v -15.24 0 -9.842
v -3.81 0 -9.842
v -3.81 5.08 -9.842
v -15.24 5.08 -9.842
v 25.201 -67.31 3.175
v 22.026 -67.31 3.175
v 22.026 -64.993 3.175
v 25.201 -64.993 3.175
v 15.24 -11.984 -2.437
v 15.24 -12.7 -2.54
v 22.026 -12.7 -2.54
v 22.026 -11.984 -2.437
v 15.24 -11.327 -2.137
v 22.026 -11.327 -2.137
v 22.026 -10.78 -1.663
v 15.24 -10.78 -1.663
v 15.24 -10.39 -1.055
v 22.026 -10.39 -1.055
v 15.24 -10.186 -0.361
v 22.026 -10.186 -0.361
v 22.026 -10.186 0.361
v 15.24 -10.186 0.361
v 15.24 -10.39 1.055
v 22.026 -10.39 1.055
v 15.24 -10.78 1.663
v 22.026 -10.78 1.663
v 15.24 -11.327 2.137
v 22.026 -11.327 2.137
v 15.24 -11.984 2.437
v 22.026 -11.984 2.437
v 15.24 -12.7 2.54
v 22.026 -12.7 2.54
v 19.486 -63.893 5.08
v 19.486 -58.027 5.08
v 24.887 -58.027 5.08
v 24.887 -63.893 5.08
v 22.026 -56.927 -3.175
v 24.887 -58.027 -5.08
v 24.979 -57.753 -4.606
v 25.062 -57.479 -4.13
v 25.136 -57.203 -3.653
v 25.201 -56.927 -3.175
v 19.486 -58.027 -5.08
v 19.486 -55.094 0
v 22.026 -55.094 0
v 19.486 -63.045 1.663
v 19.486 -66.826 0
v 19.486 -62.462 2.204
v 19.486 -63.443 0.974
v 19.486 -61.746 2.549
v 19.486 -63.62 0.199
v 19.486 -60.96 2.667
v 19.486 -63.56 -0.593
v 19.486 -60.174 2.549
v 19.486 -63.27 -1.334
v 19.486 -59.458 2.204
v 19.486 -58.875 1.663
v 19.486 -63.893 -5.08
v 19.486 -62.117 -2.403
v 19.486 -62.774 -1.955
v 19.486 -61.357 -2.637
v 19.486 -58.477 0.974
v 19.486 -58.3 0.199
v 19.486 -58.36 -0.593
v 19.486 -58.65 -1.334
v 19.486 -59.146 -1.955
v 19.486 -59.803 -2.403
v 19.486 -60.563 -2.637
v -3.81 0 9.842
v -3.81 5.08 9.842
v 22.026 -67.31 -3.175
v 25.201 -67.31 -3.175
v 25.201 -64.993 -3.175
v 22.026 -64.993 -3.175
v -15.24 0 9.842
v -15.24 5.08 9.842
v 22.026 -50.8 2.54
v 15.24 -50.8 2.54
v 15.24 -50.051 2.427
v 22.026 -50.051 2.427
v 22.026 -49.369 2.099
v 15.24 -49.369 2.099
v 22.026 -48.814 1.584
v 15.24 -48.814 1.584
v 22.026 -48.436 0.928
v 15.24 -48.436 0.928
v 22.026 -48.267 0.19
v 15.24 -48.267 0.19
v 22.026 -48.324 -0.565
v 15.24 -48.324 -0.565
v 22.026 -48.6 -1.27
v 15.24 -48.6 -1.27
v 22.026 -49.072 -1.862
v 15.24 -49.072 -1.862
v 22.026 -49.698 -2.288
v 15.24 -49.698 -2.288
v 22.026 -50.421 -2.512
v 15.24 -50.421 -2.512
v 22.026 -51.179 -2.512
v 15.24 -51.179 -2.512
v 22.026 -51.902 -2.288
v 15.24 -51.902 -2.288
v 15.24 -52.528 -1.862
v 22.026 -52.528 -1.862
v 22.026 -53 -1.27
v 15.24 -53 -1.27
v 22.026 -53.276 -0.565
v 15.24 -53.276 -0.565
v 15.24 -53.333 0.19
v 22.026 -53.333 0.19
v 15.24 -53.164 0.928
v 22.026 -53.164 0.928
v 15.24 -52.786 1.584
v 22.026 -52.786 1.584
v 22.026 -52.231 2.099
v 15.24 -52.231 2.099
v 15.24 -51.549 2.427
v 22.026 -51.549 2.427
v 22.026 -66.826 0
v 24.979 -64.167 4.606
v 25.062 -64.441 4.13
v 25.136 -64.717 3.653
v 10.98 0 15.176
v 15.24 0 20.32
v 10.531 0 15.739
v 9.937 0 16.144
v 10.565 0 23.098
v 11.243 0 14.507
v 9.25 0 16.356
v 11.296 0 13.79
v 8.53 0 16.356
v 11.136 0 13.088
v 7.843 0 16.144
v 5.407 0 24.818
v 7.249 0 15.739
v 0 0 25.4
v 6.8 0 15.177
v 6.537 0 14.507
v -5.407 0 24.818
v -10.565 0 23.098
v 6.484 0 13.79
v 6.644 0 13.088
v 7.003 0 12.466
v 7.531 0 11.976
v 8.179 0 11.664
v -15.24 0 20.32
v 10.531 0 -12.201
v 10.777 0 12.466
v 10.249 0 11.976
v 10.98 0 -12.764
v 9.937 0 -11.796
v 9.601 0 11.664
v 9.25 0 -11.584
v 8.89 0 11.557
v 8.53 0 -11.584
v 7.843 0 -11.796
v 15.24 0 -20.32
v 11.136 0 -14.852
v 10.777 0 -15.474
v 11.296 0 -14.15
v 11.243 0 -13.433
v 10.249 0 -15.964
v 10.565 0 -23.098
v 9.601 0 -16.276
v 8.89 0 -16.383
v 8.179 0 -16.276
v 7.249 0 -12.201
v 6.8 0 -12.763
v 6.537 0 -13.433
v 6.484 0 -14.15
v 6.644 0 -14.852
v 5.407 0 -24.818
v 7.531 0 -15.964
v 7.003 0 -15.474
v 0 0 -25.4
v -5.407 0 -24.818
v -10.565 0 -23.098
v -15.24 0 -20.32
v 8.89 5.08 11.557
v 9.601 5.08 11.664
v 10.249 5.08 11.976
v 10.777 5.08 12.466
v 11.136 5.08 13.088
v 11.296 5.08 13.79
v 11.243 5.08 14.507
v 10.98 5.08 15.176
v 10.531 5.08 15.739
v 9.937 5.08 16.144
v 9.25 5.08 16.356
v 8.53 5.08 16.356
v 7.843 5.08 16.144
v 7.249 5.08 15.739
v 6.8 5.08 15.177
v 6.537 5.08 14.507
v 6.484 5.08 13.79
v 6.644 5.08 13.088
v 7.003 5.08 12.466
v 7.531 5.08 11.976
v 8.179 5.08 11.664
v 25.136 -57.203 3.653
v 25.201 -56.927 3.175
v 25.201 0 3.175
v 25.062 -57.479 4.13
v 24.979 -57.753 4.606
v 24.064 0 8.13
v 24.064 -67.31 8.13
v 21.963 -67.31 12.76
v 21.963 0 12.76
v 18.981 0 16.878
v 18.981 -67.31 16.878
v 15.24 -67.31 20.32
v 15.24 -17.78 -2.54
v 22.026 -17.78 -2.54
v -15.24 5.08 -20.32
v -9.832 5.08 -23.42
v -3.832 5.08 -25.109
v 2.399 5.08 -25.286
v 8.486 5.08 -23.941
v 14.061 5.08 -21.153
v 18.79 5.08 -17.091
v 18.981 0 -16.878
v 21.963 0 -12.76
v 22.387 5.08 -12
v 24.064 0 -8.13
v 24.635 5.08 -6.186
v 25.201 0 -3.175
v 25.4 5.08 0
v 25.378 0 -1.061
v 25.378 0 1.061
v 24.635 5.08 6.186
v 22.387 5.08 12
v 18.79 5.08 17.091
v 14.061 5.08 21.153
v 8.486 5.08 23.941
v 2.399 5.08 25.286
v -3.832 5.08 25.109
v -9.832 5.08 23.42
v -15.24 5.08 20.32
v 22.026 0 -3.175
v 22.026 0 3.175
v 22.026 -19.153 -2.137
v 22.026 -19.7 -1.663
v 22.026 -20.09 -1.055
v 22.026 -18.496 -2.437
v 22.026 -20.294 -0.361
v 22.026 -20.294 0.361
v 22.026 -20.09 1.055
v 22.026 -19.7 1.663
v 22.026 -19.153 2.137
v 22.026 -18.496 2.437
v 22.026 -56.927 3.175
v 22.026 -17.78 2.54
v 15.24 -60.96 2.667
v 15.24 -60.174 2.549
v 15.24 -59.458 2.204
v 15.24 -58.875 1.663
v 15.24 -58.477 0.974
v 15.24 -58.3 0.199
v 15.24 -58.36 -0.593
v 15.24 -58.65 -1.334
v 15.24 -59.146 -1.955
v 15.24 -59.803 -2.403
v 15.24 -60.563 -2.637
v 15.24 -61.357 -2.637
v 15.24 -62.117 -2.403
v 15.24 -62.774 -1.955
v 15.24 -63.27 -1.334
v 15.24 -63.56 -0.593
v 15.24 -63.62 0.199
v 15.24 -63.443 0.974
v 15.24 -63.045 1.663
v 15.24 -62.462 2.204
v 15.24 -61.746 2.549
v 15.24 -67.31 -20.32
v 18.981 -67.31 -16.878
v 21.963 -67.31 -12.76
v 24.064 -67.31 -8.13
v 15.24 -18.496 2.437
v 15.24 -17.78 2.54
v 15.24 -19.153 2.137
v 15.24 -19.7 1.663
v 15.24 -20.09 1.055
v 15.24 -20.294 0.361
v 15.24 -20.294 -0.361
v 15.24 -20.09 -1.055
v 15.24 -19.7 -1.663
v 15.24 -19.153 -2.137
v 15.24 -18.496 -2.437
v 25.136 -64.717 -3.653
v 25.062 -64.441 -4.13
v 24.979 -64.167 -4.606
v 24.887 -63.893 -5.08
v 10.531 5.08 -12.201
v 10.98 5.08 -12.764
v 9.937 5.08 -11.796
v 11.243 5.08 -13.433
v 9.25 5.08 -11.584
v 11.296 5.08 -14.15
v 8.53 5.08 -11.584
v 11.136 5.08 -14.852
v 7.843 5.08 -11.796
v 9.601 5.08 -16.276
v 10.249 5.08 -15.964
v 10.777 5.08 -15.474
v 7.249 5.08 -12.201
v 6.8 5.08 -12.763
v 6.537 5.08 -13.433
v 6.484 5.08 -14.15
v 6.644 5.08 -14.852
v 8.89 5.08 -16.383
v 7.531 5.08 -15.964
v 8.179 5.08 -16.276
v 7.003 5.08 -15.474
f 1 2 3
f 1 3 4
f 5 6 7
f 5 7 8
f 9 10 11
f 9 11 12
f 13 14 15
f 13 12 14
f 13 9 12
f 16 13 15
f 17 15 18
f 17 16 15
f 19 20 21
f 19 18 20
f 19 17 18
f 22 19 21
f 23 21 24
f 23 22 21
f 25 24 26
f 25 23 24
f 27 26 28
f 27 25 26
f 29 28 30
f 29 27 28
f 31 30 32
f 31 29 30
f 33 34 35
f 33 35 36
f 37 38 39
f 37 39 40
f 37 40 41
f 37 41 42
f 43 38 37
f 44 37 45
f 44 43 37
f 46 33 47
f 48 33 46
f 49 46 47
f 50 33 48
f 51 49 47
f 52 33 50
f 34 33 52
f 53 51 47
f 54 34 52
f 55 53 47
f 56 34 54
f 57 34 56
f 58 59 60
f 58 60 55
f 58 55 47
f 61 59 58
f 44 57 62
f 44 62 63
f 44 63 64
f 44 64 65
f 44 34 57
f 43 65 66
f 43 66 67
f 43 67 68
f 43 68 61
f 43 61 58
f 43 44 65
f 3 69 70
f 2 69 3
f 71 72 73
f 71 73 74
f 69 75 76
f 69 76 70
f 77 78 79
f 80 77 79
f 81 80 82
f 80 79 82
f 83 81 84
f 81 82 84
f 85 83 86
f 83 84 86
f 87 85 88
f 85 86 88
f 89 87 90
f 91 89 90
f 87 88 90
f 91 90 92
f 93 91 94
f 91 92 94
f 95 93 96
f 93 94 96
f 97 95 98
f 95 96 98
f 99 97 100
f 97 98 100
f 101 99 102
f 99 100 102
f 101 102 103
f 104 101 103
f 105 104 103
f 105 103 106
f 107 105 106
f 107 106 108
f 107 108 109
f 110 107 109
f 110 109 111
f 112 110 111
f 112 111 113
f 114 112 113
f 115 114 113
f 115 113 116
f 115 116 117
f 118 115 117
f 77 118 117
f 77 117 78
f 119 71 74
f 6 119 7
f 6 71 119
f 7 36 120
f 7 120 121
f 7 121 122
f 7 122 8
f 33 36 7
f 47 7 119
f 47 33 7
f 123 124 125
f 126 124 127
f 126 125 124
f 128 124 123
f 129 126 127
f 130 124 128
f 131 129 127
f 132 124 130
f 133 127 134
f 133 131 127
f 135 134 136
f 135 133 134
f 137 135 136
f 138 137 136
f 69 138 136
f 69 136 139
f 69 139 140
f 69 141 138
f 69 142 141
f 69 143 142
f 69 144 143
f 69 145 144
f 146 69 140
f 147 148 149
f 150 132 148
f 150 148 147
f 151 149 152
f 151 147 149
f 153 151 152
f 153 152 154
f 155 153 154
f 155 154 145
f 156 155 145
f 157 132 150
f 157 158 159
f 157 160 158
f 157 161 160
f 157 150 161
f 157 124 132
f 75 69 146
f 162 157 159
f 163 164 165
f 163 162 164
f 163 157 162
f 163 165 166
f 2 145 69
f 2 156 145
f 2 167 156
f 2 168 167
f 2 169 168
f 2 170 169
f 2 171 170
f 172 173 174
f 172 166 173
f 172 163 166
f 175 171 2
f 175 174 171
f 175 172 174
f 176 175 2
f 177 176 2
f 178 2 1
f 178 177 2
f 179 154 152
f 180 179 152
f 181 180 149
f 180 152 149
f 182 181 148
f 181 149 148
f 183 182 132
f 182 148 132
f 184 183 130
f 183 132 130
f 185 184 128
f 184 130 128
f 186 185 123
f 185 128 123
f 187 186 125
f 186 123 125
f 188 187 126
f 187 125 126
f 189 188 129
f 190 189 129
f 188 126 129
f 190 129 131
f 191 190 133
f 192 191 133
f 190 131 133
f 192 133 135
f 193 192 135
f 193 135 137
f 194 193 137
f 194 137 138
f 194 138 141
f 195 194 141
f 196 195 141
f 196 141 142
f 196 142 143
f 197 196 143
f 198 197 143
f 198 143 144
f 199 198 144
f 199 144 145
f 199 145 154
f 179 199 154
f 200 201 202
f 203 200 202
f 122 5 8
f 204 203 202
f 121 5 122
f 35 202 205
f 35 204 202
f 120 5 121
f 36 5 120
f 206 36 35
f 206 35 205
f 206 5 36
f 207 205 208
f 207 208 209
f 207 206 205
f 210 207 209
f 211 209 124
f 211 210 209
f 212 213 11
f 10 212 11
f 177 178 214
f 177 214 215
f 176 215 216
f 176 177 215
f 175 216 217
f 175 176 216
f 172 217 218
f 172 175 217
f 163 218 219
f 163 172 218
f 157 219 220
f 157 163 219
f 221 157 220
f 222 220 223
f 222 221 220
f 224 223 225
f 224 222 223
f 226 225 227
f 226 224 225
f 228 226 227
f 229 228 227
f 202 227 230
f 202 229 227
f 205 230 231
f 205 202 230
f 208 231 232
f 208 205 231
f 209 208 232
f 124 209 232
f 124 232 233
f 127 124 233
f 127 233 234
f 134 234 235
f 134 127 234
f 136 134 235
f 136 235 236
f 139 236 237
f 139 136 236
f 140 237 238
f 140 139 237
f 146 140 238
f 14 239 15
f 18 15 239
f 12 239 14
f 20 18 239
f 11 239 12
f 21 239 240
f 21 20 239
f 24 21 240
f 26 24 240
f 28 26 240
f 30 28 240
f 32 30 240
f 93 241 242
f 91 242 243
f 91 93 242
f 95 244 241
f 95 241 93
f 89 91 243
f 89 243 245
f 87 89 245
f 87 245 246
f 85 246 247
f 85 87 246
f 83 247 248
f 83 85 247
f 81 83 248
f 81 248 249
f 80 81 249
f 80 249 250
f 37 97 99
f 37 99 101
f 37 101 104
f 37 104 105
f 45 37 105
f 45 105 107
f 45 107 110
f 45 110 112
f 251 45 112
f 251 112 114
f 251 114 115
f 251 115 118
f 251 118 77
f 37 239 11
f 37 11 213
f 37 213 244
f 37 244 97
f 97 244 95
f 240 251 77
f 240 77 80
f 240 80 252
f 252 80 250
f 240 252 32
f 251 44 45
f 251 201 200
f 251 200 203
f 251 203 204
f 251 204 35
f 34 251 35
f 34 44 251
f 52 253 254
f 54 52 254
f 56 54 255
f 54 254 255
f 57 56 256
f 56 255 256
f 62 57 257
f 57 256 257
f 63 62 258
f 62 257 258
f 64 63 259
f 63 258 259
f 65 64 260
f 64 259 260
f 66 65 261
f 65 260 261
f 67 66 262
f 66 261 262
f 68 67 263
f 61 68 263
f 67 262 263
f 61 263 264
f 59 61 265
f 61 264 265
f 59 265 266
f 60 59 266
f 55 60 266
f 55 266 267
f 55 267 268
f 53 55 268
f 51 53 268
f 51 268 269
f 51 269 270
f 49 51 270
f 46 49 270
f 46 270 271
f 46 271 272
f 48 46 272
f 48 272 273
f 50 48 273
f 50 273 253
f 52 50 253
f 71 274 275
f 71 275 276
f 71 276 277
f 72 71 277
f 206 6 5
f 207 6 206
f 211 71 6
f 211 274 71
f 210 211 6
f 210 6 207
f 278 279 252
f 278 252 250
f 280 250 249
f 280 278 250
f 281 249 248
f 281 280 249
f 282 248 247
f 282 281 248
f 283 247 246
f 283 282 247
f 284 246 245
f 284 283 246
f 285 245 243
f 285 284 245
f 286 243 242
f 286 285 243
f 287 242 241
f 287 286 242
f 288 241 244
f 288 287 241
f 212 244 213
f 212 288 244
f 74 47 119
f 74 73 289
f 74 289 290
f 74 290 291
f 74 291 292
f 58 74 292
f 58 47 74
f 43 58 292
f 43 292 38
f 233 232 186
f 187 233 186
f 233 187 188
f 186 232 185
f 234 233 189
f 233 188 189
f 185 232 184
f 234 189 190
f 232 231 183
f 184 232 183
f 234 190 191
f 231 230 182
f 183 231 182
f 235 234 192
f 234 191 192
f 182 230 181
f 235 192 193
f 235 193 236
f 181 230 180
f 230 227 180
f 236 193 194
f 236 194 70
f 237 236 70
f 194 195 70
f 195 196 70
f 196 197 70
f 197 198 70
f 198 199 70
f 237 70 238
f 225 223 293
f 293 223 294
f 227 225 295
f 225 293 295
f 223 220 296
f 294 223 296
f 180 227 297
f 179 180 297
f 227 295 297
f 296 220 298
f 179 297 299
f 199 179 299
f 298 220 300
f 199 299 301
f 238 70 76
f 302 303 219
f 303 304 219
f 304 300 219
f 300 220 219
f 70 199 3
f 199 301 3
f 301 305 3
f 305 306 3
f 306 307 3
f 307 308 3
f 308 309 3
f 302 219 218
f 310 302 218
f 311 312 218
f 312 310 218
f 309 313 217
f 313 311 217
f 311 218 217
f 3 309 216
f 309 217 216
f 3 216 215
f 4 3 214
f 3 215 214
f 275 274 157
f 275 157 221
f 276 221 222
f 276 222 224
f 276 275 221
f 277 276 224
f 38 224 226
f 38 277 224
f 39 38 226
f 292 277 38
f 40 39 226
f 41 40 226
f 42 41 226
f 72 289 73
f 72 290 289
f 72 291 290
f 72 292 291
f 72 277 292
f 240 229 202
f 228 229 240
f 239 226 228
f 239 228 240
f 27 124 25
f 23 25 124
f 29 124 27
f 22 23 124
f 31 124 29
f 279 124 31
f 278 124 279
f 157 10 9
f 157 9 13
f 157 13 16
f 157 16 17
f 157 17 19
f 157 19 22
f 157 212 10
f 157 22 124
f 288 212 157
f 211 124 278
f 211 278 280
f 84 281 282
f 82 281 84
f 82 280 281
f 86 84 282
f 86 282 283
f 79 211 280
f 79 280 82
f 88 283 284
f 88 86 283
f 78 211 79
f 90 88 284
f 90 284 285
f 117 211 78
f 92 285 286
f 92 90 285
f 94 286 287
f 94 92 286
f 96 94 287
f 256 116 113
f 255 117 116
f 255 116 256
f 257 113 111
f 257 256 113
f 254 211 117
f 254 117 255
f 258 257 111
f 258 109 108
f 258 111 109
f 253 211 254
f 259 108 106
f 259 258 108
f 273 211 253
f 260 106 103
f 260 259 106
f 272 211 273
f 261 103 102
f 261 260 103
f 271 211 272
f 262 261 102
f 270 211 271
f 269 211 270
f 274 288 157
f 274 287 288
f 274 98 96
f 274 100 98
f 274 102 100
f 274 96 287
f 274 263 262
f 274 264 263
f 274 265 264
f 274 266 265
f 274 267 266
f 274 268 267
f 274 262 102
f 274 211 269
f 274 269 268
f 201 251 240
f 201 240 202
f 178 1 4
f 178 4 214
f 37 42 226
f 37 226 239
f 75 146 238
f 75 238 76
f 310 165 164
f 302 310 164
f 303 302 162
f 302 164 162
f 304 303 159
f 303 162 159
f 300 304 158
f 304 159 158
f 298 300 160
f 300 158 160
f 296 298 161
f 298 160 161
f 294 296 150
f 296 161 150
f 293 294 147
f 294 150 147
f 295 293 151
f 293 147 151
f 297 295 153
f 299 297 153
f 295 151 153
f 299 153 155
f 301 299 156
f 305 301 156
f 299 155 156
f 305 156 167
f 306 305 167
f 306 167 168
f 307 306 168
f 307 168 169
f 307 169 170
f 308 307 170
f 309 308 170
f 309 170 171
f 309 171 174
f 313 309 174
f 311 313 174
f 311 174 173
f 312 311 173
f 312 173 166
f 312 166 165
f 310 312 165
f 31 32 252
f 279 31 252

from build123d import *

# Parameters (mm, degrees)
PLATE_DEPTH             = 5.08
BOLTHOLES_REACH         = 38.278
SKETCH15_R              = 2.413
UPRIGHT_START           = 67.31
UPRIGHT_DEPTH           = 67.31
UPRIGHT_BOLTHOLES_REACH = 80.133
SKETCH17_R              = 2.54
SKETCH17_R_2            = 2.667
NUT_HOLE_START          = -2.54
NUT_HOLE_DEPTH          = 5.715


with BuildPart() as part:
    # Sketch2 → plate (new body)
    with BuildSketch(Plane(origin=(0, 0, 0), x_dir=(1, 0, 0), z_dir=(0, 1, 0))):
        with BuildLine():
            Line((-15.24, -20.32), (-15.24, -9.8425))
            Line((-15.24, -9.8425), (-3.81, -9.8425))
            Line((-3.81, -9.8425), (-3.81, 9.8425))
            Line((-3.81, 9.8425), (-15.24, 9.8425))
            Line((-15.24, 9.8425), (-15.24, 20.32))
            ThreePointArc((-15.24, 20.32), (25.4, 0), (-15.24, -20.32))
        make_face()
    extrude(amount=PLATE_DEPTH)

    # Sketch15 → boltholes (cut, up to next)
    with BuildSketch(Plane.XZ, mode=Mode.PRIVATE) as boltholes_sk1:
        with Locations(Location((8.89, 13.97, 0), (0, 0, 270))):
            Circle(SKETCH15_R)
    boltholes_tool1 = extrude(boltholes_sk1.sketch, amount=-BOLTHOLES_REACH, mode=Mode.PRIVATE) & part.part
    # Sketch15 → boltholes (cut, up to next)
    with BuildSketch(Plane.XZ, mode=Mode.PRIVATE) as boltholes_sk2:
        with Locations(Location((8.89, -13.97, 0), (0, 0, 270))):
            Circle(SKETCH15_R)
    boltholes_tool2 = extrude(boltholes_sk2.sketch, amount=-BOLTHOLES_REACH, mode=Mode.PRIVATE) & part.part
    add(boltholes_tool1.solids().sort_by_distance((8.89, 0, 13.97))[0], mode=Mode.SUBTRACT)
    add(boltholes_tool2.solids().sort_by_distance((8.89, 0, -13.97))[0], mode=Mode.SUBTRACT)

    # Sketch16 → upright (add)
    with BuildSketch(Plane.XZ.offset(UPRIGHT_START)):
        with BuildLine():
            Line((15.24, 20.32), (15.24, -20.32))
            ThreePointArc((15.24, -20.32), (21.962512448, -12.759625659), (25.200781238, -3.175))
            Line((25.200781238, -3.175), (22.025781238, -3.175))
            Line((22.025781238, -3.175), (22.025781238, 3.175))
            Line((22.025781238, 3.175), (25.200781238, 3.175))
            ThreePointArc((25.200781238, 3.175), (21.962512448, 12.759625659), (15.24, 20.32))
        make_face()
    extrude(amount=-UPRIGHT_DEPTH)

    # Sketch17 → upright_boltholes (cut, up to next)
    with BuildSketch(Plane.ZY.offset(-15.24), mode=Mode.PRIVATE) as upright_boltholes_sk1:
        with Locations((0, -50.8)):
            Circle(SKETCH17_R)
    upright_boltholes_tool1 = extrude(upright_boltholes_sk1.sketch, amount=-UPRIGHT_BOLTHOLES_REACH, mode=Mode.PRIVATE) & part.part
    # Sketch17 → upright_boltholes (cut, up to next)
    with BuildSketch(Plane.ZY.offset(-15.24), mode=Mode.PRIVATE) as upright_boltholes_sk2:
        with Locations((0, -60.96)):
            Circle(SKETCH17_R_2)
    upright_boltholes_tool2 = extrude(upright_boltholes_sk2.sketch, amount=-UPRIGHT_BOLTHOLES_REACH, mode=Mode.PRIVATE) & part.part
    # Sketch17 → upright_boltholes (cut, up to next)
    with BuildSketch(Plane.ZY.offset(-15.24), mode=Mode.PRIVATE) as upright_boltholes_sk3:
        with BuildLine():
            Line((2.54, -12.7), (2.54, -17.78))
            ThreePointArc((2.54, -17.78), (0, -20.32), (-2.54, -17.78))
            Line((-2.54, -17.78), (-2.54, -12.7))
            ThreePointArc((-2.54, -12.7), (0, -10.16), (2.54, -12.7))
        make_face()
    upright_boltholes_tool3 = extrude(upright_boltholes_sk3.sketch, amount=-UPRIGHT_BOLTHOLES_REACH, mode=Mode.PRIVATE) & part.part
    add(upright_boltholes_tool1.solids().sort_by_distance((15.24, -50.8, 0))[0], mode=Mode.SUBTRACT)
    add(upright_boltholes_tool2.solids().sort_by_distance((15.24, -60.96, 0))[0], mode=Mode.SUBTRACT)
    add(upright_boltholes_tool3.solids().sort_by_distance((15.24, -15.24, 0))[0], mode=Mode.SUBTRACT)

    # Sketch18 → nut_hole (cut)
    with BuildSketch(Plane(origin=(22.025781238, 0, 0), x_dir=(0, 0, -1), z_dir=(1, 0, 0)).offset(NUT_HOLE_START)):
        Polygon((0, -66.825878735), (5.08, -63.892939367), (5.08, -58.027060633), (0, -55.094121265), (-5.08, -58.027060633), (-5.08, -63.892939367), align=None)
    extrude(amount=NUT_HOLE_DEPTH, mode=Mode.SUBTRACT)


solid = part.part
